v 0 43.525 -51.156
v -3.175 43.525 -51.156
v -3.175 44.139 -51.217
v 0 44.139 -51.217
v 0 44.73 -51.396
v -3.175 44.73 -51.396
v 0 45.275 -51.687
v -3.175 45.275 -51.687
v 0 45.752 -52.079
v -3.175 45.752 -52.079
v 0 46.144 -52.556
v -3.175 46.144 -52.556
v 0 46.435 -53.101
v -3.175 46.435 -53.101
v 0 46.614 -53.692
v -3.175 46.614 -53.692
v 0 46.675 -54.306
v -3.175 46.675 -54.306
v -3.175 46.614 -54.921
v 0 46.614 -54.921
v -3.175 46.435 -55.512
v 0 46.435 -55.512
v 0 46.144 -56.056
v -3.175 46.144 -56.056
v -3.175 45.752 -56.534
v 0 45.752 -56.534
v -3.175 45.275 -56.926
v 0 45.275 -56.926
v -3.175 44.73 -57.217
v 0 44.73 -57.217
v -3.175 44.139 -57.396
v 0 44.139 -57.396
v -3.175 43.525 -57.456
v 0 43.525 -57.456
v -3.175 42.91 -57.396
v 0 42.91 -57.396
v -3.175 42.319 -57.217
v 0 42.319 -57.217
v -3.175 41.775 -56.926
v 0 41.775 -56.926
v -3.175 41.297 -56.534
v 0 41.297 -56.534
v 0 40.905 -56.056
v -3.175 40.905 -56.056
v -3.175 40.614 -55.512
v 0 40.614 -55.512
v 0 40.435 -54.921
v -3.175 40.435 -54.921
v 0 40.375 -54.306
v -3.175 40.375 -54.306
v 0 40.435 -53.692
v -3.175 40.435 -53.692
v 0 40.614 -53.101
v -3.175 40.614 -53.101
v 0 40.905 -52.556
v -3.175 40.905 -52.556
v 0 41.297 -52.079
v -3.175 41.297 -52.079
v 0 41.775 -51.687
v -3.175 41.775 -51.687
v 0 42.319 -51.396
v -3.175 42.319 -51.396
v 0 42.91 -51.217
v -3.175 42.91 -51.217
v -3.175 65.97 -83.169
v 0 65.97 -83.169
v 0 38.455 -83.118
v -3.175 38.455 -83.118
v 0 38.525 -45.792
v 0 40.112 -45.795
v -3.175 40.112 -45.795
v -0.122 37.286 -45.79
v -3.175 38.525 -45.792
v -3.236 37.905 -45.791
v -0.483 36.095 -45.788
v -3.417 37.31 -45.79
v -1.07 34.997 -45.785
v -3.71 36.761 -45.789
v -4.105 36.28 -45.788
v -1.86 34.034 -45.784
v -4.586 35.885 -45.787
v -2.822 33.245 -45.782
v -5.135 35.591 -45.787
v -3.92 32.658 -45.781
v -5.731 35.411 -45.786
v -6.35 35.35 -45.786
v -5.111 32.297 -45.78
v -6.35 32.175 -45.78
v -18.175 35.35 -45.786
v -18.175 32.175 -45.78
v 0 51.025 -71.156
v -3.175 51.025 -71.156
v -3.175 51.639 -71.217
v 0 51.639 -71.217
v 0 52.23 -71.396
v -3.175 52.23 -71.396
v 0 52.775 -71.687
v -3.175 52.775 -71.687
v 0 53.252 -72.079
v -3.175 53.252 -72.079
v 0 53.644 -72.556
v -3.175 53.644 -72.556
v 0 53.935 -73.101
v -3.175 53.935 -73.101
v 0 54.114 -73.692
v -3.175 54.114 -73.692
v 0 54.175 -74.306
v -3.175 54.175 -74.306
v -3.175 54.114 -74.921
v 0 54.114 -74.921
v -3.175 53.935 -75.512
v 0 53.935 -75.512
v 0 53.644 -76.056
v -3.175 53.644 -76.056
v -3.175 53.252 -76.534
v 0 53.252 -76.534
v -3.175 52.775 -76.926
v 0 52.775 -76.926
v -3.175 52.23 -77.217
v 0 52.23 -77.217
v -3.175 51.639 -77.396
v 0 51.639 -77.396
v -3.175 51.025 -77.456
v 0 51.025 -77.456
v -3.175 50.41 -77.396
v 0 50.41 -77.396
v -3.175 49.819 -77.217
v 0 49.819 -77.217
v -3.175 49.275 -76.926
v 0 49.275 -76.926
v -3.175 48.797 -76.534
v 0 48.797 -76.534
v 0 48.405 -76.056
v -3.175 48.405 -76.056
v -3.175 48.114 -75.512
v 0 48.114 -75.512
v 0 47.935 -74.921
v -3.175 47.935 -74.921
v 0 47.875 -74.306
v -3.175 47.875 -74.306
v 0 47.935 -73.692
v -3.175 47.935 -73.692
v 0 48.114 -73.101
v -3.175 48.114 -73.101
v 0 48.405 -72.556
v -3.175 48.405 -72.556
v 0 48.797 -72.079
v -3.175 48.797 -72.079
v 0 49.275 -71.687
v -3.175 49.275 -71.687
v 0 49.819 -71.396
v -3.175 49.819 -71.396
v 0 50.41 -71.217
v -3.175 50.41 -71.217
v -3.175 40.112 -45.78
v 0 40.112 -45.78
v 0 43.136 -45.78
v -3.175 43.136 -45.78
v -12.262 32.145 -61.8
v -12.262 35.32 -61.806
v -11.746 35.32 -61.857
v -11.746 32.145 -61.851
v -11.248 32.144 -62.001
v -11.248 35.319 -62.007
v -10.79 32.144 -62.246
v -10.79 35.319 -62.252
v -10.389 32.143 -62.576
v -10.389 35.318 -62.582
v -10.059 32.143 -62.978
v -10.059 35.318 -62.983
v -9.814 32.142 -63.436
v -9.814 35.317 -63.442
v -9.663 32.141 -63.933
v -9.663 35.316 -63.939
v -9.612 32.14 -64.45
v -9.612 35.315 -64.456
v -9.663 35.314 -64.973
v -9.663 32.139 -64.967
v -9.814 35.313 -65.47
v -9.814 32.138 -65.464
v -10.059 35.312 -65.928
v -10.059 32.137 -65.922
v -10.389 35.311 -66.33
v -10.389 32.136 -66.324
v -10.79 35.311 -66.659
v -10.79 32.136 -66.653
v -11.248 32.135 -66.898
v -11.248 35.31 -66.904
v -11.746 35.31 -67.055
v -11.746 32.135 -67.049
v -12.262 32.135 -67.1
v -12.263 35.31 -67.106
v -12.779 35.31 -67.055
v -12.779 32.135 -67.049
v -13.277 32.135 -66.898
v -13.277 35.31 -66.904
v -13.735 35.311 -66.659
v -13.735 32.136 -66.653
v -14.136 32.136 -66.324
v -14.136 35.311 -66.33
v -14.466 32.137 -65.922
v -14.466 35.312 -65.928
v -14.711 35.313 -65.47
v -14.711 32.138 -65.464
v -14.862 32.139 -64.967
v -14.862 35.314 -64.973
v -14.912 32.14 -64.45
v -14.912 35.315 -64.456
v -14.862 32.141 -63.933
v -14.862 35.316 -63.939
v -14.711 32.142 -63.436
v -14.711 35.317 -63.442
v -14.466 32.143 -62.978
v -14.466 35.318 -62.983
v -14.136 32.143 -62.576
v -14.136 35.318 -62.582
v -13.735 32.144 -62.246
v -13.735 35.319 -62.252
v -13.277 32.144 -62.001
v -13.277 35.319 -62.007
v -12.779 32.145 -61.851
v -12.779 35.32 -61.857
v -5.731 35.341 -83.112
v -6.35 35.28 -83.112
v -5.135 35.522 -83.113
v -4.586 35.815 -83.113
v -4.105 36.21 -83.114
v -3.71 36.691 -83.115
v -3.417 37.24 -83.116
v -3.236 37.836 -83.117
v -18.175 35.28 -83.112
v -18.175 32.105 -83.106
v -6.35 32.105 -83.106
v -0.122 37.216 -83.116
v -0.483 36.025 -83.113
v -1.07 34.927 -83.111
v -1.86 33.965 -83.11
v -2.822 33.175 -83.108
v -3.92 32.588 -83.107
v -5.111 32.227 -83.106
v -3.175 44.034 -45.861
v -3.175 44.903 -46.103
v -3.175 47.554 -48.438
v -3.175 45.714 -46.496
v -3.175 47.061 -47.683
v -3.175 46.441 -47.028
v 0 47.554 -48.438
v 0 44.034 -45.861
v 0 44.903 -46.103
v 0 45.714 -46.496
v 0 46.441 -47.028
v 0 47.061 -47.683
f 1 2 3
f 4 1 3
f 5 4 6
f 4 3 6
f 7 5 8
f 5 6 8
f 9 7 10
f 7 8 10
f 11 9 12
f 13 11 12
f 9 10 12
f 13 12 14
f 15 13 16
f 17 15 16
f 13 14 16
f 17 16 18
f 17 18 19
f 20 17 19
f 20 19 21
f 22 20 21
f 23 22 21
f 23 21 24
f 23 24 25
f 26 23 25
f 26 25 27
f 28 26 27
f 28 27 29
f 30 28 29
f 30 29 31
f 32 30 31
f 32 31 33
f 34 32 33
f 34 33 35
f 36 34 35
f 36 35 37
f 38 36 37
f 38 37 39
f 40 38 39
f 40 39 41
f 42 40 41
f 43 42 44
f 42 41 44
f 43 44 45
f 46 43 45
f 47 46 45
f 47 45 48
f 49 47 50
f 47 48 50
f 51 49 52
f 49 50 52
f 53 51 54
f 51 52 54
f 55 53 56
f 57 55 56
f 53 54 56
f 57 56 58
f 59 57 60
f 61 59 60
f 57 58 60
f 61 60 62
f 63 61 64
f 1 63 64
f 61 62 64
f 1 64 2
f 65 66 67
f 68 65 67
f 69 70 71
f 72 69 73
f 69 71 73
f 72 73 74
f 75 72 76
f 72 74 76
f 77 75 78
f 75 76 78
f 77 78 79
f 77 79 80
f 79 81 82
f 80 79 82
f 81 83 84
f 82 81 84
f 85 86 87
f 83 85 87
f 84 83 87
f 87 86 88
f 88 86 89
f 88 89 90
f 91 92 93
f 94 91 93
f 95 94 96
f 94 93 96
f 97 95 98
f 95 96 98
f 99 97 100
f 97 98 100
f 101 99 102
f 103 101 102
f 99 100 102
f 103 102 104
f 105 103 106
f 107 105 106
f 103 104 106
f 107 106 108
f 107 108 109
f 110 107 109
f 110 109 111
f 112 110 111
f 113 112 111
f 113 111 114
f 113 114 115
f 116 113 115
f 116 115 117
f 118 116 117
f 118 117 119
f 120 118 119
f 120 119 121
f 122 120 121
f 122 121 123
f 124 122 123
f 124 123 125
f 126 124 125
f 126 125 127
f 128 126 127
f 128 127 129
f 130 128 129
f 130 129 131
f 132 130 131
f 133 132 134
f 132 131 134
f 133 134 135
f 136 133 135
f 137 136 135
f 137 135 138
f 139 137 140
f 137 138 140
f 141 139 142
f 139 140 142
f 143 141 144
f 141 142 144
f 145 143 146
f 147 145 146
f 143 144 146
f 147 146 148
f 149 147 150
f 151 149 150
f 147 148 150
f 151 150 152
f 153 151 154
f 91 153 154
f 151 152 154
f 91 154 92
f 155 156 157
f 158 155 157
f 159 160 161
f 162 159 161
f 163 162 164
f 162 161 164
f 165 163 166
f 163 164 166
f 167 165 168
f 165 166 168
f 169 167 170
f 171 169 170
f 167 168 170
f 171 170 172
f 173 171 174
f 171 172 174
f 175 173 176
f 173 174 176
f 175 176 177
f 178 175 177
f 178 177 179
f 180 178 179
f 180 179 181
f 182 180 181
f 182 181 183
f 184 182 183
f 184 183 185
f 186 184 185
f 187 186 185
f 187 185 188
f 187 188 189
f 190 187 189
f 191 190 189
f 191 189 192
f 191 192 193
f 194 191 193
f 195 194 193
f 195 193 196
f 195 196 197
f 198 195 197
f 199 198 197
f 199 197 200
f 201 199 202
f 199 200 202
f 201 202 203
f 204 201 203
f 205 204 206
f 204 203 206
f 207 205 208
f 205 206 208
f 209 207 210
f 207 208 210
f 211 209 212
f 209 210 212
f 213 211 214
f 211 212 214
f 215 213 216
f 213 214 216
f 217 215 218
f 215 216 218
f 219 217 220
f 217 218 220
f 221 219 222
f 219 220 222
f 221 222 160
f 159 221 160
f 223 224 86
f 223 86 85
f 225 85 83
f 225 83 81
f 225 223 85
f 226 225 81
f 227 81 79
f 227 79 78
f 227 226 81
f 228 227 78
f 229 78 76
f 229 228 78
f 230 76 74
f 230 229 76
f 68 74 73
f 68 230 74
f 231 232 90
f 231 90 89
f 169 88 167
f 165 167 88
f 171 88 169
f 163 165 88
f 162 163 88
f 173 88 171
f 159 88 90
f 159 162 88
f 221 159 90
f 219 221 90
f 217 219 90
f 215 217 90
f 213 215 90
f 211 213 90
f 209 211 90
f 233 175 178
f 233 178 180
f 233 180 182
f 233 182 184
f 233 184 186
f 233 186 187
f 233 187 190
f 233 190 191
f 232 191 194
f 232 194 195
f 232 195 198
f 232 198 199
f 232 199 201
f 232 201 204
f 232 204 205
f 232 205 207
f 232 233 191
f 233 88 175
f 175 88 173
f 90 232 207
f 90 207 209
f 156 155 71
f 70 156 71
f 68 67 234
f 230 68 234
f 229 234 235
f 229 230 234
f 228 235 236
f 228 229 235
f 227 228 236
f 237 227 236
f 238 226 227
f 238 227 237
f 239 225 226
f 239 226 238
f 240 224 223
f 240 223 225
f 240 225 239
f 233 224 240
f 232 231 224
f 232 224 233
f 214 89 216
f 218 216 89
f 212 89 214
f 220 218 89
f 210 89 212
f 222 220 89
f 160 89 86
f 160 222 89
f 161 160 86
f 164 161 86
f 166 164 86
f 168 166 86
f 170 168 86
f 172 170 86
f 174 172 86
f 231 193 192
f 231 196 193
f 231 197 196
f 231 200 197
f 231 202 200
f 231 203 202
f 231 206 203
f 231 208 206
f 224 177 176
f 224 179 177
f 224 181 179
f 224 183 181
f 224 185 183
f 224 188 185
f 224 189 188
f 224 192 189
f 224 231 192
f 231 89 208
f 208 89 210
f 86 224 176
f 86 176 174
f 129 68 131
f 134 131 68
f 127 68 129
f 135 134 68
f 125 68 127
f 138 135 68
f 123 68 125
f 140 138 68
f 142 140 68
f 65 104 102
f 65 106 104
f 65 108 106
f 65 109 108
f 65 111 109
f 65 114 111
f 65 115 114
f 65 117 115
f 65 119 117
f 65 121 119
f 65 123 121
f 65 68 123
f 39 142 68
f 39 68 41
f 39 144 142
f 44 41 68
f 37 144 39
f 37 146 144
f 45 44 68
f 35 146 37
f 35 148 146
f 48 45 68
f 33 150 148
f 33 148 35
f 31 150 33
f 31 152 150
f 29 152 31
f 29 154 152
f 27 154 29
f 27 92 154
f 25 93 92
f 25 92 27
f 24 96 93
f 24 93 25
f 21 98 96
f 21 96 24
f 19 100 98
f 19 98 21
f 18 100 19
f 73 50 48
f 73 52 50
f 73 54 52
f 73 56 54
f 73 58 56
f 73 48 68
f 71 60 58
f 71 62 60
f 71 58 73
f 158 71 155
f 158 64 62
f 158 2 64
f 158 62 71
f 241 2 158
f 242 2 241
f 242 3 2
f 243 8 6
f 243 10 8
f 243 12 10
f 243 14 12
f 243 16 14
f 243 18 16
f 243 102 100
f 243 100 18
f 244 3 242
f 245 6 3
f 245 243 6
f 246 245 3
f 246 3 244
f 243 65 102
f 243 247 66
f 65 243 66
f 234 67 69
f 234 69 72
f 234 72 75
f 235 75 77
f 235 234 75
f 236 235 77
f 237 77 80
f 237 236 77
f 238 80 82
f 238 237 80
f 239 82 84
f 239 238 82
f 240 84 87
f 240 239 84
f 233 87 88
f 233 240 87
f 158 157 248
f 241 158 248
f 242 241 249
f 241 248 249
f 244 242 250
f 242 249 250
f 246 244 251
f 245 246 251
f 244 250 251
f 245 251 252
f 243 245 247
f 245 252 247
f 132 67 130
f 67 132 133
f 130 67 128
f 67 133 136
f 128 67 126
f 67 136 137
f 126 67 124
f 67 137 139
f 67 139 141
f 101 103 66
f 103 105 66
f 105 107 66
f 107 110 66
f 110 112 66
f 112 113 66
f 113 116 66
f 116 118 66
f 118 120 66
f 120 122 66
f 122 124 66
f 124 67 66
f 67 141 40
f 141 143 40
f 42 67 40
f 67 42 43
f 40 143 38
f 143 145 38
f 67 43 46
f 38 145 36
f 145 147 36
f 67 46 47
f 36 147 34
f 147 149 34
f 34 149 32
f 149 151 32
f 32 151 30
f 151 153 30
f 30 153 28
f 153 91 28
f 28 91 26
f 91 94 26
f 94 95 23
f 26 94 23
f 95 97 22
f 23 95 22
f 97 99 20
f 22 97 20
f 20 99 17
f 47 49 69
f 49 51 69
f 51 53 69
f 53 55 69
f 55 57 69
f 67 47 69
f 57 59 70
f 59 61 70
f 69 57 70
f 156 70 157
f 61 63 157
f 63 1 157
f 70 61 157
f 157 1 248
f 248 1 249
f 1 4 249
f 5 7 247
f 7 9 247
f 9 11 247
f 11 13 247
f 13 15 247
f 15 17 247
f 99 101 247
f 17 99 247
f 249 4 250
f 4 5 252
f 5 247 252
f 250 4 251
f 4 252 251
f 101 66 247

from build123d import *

# Parameters (mm, degrees)
BASE_FLANGE1_DEPTH            = 3.175
EDGE_FLANGE1_STRIP_W          = 19.05
EDGE_FLANGE1_STRIP_H          = 3.175
EDGE_FLANGE1_STRIP_CUT_DEPTH  = 37.325997284
EDGE_FLANGE1_RELIEF_W         = 20.6375
EDGE_FLANGE1_RELIEF_H         = 1.5875
EDGE_FLANGE1_RELIEF_CUT_DEPTH = 3.175
EDGE_FLANGE1_DEPTH            = 37.325997284
SKETCH15_R                    = 2.65
CUT_EXTRUDE2_DEPTH            = 10
SKETCH19_R                    = 3.15
CUT_EXTRUDE4_DEPTH            = 10


# Sheet-metal steps are written as plain solids
with BuildPart() as part:
    # Sketch3 → Base-Flange1 (new body)
    with BuildSketch(Plane(origin=(0, 0, 0), x_dir=(0, 0, -1), z_dir=(1, 0, 0))):
        with BuildLine():
            Line((83.106142408, 32.105064535), (45.780209905, 32.174606262))
            Line((45.780209905, 32.174606262), (45.780209905, 43.136168925))
            ThreePointArc((45.780209905, 43.136168925), (46.495831721, 45.713784796), (48.437851335, 47.553561406))
            Line((48.437851335, 47.553561406), (83.169236275, 65.970162941))
            Line((83.169236275, 65.970162941), (83.106142408, 32.105064535))
        make_face()
    extrude(amount=-BASE_FLANGE1_DEPTH)

    # Edge-Flange1 strip (across the edge) → Edge-Flange1 strip cut (cut)
    with BuildSketch(Plane(origin=(-3.175, 32.105064535, -83.106142408), x_dir=(-3.4914813388431334e-15, 0.999998264444559, -0.001863090945206598), z_dir=(0, 0.001863090945206598, 0.999998264444559))):
        with Locations((-3.175, -1.5875)):
            Rectangle(EDGE_FLANGE1_STRIP_W, EDGE_FLANGE1_STRIP_H)
    extrude(amount=EDGE_FLANGE1_STRIP_CUT_DEPTH, mode=Mode.SUBTRACT)

    # Edge-Flange1 relief (on the sheet) → Edge-Flange1 relief cut (cut)
    with BuildSketch(Plane(origin=(-3.175, 38.455053514, -83.117973035), x_dir=(-6.982962677686267e-15, 0.999998264444559, -0.001863090945206598), z_dir=(-1, 0, 0))):
        with Locations((-8.73125, -38.119747284)):
            Rectangle(EDGE_FLANGE1_RELIEF_W, EDGE_FLANGE1_RELIEF_H)
    extrude(amount=-EDGE_FLANGE1_RELIEF_CUT_DEPTH, mode=Mode.SUBTRACT)

    # Edge-Flange1 section (across the edge) → Edge-Flange1 (add)
    with BuildSketch(Plane(origin=(-3.175, 32.105064535, -83.106142408), x_dir=(-3.4914813388431334e-15, 0.999998264444559, -0.001863090945206598), z_dir=(0, 0.001863090945206598, 0.999998264444559))):
        with BuildLine():
            Line((0, 3.175), (0, 15))
            Line((0, 15), (3.175, 15))
            Line((3.175, 15), (3.175, 3.175))
            ThreePointArc((3.175, 3.175), (4.10493597, 0.92993597), (6.35, 0))
            Line((6.35, 0), (6.35, -3.175))
            ThreePointArc((6.35, -3.175), (1.859871939, -1.315128061), (0, 3.175))
        make_face()
    extrude(amount=EDGE_FLANGE1_DEPTH)

    # Sketch15 → Cut-Extrude2 (cut)
    with BuildSketch(Plane(origin=(0, 35.434781617, -0.066018335), x_dir=(1, 0, 0), z_dir=(-3.23986857388729e-15, 0.999998264444559, -0.0018630909452065992))):
        with Locations(Location((-12.2625, 64.389781839, 0), (0, 0, 270))):
            Circle(SKETCH15_R)
    extrude(amount=-CUT_EXTRUDE2_DEPTH, mode=Mode.SUBTRACT)

    # Sketch19 → Cut-Extrude4 (cut)
    with BuildSketch(Plane.ZY.offset(3.175)):
        with Locations((-74.30640548, 51.024595242)):
            Circle(SKETCH19_R)
        with Locations((-54.306440614, 43.524595242)):
            Circle(SKETCH19_R)
    extrude(amount=-CUT_EXTRUDE4_DEPTH, mode=Mode.SUBTRACT)


solid = part.part
